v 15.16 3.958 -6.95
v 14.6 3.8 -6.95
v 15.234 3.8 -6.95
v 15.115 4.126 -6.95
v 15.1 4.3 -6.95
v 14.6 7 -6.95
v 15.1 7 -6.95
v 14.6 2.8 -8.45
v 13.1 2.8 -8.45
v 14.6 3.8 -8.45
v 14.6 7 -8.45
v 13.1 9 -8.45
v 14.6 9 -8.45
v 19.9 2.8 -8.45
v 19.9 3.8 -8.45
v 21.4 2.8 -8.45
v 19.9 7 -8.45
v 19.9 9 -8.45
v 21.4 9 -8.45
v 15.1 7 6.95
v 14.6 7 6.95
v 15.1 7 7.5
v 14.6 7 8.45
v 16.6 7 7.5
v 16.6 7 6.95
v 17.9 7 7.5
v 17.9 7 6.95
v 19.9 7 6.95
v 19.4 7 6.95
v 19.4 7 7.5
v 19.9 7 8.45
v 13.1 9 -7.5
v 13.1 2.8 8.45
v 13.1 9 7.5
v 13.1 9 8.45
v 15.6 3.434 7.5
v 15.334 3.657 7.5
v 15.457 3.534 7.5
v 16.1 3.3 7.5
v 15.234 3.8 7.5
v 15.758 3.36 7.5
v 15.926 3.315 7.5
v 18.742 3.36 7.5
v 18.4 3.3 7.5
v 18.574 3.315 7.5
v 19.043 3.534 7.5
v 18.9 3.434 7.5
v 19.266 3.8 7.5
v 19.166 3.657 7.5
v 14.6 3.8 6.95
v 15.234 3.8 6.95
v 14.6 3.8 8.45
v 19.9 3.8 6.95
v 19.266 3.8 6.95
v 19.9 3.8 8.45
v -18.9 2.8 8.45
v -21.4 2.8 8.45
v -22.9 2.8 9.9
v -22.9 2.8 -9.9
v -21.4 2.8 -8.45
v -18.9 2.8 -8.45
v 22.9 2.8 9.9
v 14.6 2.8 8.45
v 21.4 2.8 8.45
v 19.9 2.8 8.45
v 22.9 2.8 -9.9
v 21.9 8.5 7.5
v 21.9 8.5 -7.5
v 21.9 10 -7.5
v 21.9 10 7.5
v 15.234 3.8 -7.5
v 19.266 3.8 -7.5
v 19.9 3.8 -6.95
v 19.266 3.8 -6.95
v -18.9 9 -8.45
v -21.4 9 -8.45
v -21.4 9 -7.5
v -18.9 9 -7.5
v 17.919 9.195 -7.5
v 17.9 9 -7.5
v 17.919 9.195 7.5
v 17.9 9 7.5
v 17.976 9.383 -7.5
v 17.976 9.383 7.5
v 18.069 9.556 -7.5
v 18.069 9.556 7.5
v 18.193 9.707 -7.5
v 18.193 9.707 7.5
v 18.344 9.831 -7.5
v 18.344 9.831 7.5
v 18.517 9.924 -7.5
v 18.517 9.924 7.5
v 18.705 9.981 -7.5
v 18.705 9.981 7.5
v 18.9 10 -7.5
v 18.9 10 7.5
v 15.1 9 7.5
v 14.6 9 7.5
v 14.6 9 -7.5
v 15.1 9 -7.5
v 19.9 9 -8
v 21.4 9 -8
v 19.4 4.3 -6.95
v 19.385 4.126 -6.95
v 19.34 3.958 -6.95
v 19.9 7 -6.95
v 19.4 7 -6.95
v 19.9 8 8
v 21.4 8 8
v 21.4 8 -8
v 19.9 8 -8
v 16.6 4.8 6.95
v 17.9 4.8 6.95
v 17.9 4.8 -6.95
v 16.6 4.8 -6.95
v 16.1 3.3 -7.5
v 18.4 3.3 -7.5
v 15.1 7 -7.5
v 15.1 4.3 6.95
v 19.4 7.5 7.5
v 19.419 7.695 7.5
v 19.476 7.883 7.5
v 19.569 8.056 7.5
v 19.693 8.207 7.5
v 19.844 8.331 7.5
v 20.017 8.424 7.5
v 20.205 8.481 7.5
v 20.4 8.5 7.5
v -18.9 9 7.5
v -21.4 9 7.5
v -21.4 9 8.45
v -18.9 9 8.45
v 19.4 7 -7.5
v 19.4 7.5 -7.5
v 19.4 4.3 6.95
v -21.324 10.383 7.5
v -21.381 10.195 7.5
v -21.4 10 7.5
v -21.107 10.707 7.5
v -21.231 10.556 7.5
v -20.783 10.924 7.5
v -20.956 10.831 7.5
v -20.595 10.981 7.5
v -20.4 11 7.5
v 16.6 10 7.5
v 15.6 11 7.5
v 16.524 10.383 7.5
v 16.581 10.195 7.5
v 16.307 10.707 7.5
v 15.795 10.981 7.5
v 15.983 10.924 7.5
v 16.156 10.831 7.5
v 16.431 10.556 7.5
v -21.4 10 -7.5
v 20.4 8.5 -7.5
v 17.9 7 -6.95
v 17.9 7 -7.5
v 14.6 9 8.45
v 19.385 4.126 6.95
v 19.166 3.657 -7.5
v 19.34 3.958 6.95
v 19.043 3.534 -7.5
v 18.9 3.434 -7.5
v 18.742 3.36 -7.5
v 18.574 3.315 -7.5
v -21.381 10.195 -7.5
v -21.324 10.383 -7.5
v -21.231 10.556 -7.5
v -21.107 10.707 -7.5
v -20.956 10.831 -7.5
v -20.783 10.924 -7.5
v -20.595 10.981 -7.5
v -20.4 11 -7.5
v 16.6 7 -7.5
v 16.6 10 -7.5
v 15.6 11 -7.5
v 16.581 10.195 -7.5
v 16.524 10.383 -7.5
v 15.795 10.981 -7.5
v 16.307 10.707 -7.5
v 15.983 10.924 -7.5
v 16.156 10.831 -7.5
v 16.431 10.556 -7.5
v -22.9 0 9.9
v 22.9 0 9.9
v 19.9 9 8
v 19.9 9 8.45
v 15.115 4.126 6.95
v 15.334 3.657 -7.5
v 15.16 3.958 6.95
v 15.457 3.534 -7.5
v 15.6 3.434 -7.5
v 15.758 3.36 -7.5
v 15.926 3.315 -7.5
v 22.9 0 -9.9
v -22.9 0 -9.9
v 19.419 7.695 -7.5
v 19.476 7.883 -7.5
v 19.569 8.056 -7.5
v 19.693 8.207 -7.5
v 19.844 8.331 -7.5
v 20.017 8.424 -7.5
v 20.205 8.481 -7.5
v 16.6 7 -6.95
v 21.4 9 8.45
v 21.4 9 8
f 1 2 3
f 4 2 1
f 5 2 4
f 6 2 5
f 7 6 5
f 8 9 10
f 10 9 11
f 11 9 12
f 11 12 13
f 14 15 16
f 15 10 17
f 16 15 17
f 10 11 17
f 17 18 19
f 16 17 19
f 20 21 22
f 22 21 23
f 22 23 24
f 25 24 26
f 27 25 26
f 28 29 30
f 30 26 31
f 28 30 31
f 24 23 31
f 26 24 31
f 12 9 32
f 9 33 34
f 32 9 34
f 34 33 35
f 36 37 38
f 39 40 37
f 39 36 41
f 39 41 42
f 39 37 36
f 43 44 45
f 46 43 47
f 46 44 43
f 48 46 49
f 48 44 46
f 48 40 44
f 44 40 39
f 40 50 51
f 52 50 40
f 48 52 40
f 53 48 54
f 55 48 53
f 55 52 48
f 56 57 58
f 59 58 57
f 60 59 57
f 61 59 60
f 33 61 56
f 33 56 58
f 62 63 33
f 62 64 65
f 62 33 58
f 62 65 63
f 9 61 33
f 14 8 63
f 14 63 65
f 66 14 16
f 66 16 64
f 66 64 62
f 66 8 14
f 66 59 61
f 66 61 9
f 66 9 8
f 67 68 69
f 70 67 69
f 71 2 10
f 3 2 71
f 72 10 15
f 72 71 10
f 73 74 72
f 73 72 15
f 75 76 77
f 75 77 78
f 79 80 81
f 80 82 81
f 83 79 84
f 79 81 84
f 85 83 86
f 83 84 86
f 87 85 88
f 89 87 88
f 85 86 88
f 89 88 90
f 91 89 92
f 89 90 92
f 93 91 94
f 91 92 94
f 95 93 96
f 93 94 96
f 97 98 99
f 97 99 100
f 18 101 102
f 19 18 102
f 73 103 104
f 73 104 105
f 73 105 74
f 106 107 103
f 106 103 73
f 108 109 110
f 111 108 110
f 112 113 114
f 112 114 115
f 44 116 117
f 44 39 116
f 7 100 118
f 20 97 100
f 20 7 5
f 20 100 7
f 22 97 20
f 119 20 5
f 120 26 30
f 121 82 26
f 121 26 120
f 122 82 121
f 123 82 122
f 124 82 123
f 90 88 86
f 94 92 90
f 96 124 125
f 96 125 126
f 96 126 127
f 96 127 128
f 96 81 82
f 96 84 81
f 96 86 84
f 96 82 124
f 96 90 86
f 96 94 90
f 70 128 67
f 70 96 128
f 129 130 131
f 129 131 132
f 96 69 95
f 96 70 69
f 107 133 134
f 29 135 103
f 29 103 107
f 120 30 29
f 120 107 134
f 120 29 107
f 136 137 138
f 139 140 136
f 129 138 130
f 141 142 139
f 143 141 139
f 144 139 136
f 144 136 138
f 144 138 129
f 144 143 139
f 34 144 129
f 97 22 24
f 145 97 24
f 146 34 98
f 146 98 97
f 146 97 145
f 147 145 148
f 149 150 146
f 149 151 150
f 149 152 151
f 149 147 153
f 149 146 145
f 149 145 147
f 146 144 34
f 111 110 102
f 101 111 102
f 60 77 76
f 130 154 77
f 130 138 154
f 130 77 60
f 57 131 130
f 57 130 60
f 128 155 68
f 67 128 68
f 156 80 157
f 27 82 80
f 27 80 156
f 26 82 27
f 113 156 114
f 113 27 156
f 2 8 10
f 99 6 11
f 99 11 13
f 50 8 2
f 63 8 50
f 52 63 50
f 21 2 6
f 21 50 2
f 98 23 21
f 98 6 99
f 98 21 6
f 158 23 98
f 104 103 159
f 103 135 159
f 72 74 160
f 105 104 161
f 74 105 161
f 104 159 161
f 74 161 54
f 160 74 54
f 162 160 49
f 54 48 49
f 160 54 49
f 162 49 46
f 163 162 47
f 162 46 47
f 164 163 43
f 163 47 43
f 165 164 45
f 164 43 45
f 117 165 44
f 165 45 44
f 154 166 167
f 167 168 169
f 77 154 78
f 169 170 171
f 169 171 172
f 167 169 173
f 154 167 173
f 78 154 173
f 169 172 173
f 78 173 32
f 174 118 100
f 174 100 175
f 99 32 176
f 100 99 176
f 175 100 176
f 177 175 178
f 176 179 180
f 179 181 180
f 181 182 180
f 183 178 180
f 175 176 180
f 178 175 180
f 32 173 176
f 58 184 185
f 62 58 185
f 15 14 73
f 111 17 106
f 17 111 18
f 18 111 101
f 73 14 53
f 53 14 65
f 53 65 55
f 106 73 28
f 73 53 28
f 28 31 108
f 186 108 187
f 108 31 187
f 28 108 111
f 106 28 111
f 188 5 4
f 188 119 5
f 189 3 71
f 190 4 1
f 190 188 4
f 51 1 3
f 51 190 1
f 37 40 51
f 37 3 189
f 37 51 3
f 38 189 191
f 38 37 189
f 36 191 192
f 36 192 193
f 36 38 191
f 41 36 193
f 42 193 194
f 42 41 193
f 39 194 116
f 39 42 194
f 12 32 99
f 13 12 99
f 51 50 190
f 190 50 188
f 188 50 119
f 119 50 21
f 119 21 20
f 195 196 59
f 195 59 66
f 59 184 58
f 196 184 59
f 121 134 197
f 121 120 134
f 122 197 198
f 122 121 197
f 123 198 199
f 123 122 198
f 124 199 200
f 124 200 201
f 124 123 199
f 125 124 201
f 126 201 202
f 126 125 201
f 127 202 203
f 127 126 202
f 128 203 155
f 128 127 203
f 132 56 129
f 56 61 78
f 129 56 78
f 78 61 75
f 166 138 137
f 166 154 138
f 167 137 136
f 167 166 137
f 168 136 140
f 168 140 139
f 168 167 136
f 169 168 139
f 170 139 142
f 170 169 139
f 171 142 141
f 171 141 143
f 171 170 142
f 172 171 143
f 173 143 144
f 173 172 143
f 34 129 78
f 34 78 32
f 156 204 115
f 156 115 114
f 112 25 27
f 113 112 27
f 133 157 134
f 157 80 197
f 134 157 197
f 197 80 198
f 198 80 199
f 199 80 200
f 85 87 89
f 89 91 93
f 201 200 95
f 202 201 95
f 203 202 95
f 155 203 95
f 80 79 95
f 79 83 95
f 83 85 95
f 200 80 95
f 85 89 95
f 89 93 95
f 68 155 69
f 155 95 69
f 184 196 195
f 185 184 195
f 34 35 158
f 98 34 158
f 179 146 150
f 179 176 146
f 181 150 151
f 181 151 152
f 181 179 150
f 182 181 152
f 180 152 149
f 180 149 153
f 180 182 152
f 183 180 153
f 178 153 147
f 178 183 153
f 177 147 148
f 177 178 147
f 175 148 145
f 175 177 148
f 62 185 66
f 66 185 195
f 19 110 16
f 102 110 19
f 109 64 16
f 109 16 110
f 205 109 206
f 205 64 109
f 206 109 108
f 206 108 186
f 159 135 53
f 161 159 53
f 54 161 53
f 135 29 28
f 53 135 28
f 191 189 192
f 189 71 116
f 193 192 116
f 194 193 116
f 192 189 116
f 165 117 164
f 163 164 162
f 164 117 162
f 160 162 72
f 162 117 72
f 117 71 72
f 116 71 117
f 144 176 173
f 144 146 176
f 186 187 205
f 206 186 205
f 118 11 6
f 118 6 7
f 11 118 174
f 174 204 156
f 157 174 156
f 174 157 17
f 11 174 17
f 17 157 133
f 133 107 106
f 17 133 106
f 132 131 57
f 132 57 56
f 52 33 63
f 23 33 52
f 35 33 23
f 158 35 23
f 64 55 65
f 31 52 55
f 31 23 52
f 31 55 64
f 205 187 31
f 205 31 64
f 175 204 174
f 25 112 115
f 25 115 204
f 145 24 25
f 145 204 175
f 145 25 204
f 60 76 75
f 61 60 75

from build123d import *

# Parameters (mm, degrees)
BASE_OUTLINE_W              = 45.8
BASE_OUTLINE_H              = 19.8
CLAMP_BASE_DEPTH            = 2.8
HINGE_AND_LATCH_OUTLINE_W   = 2.5
HINGE_AND_LATCH_OUTLINE_H   = 6.2
HINGE_AND_LATCH_OUTLINE_W_2 = 8.3
CLIP_HINGE_AND_LATCH_DEPTH  = 8.45
LATCH_SIDES_CUT_REACH       = 32.694
SIDE_CUTS_OUTLINE_W         = 5.3
SIDE_CUTS_OUTLINE_H         = 2
SIDE_CUTS_OUTLINE_H_2       = 1
LATCH_THROUGH_CUT_REACH     = 27.912
THROUGH_CUT_OUTLINE_W       = 5.3
THROUGH_CUT_OUTLINE_H       = 13.9
LATCH_FRONT_CUT_REACH       = 48.276
FRONT_CUT_OUTLINE_W         = 16
FRONT_CUT_OUTLINE_H         = 1
CLAMP_DEPTH                 = 7.5
CLAMP_FILLETS_R             = 1


with BuildPart() as part:
    # Base Outline → Clamp Base (new body)
    with BuildSketch(Plane(origin=(0, 0, 0), x_dir=(1, 0, 0), z_dir=(0, 1, 0))):
        Rectangle(BASE_OUTLINE_W, BASE_OUTLINE_H)
    extrude(amount=CLAMP_BASE_DEPTH)

    # Hinge and Latch Outline → Clip Hinge and Latch (add, symmetric)
    with BuildSketch(Plane.XY):
        with Locations((-20.15, 5.9)):
            Rectangle(HINGE_AND_LATCH_OUTLINE_W, HINGE_AND_LATCH_OUTLINE_H)
        with Locations((17.25, 5.9)):
            Rectangle(HINGE_AND_LATCH_OUTLINE_W_2, HINGE_AND_LATCH_OUTLINE_H)
    extrude(amount=CLIP_HINGE_AND_LATCH_DEPTH, both=True)

    # Side Cuts Outline → Latch Sides Cut (cut, up to next)
    with BuildSketch(Plane.XY.offset(8.45), mode=Mode.PRIVATE) as latch_sides_cut_sk1:
        with Locations((17.25, 8)):
            Rectangle(SIDE_CUTS_OUTLINE_W, SIDE_CUTS_OUTLINE_H)
    latch_sides_cut_tool1 = extrude(latch_sides_cut_sk1.sketch, amount=-LATCH_SIDES_CUT_REACH, mode=Mode.PRIVATE) & part.part
    # Side Cuts Outline → Latch Sides Cut (cut, up to next)
    with BuildSketch(Plane.XY.offset(8.45), mode=Mode.PRIVATE) as latch_sides_cut_sk2:
        with Locations((17.25, 3.3)):
            Rectangle(SIDE_CUTS_OUTLINE_W, SIDE_CUTS_OUTLINE_H_2)
    latch_sides_cut_tool2 = extrude(latch_sides_cut_sk2.sketch, amount=-LATCH_SIDES_CUT_REACH, mode=Mode.PRIVATE) & part.part
    add(latch_sides_cut_tool1.solids().sort_by_distance((17.25, 8, 8.45))[0], mode=Mode.SUBTRACT)
    add(latch_sides_cut_tool2.solids().sort_by_distance((17.25, 3.3, 8.45))[0], mode=Mode.SUBTRACT)

    # Through Cut Outline → Latch Through Cut (cut, up to next)
    with BuildSketch(Plane(origin=(0, 7, 0), x_dir=(1, 0, 0), z_dir=(0, 1, 0)), mode=Mode.PRIVATE) as latch_through_cut_sk1:
        with Locations((17.25, 0)):
            Rectangle(THROUGH_CUT_OUTLINE_W, THROUGH_CUT_OUTLINE_H)
    latch_through_cut_tool1 = extrude(latch_through_cut_sk1.sketch, amount=-LATCH_THROUGH_CUT_REACH, mode=Mode.PRIVATE) & part.part
    add(latch_through_cut_tool1.solids().sort_by_distance((17.25, 7, 0))[0], mode=Mode.SUBTRACT)

    # Front Cut Outline → Latch Front Cut (cut, up to next)
    with BuildSketch(Plane(origin=(21.4, 0, 0), x_dir=(0, 0, -1), z_dir=(1, 0, 0)), mode=Mode.PRIVATE) as latch_front_cut_sk1:
        with Locations((0, 8.5)):
            Rectangle(FRONT_CUT_OUTLINE_W, FRONT_CUT_OUTLINE_H)
    latch_front_cut_tool1 = extrude(latch_front_cut_sk1.sketch, amount=-LATCH_FRONT_CUT_REACH, mode=Mode.PRIVATE) & part.part
    add(latch_front_cut_tool1.solids().sort_by_distance((21.4, 8.5, 0))[0], mode=Mode.SUBTRACT)

    # Clamp Outline → Clamp (add, symmetric)
    with BuildSketch(Plane.XY):
        Polygon((-21.4, 9), (15.1, 9), (15.1, 3.3), (19.4, 3.3), (19.4, 8.5), (21.9, 8.5), (21.9, 10), (17.9, 10), (17.9, 4.8), (16.6, 4.8), (16.6, 11), (-21.4, 11), align=None)
    extrude(amount=CLAMP_DEPTH, both=True)

    # Clamp Fillets
    clamp_fillets_edges = [part.edges().sort_by_distance(p)[0] for p in [
        (19.4, 8.5, 0),
        (17.9, 10, 0),
        (16.6, 11, 0),
        (-21.4, 11, 0),
        (19.4, 3.3, 0),
        (15.1, 3.3, 0),
    ]]
    fillet(clamp_fillets_edges, radius=CLAMP_FILLETS_R)


solid = part.part
